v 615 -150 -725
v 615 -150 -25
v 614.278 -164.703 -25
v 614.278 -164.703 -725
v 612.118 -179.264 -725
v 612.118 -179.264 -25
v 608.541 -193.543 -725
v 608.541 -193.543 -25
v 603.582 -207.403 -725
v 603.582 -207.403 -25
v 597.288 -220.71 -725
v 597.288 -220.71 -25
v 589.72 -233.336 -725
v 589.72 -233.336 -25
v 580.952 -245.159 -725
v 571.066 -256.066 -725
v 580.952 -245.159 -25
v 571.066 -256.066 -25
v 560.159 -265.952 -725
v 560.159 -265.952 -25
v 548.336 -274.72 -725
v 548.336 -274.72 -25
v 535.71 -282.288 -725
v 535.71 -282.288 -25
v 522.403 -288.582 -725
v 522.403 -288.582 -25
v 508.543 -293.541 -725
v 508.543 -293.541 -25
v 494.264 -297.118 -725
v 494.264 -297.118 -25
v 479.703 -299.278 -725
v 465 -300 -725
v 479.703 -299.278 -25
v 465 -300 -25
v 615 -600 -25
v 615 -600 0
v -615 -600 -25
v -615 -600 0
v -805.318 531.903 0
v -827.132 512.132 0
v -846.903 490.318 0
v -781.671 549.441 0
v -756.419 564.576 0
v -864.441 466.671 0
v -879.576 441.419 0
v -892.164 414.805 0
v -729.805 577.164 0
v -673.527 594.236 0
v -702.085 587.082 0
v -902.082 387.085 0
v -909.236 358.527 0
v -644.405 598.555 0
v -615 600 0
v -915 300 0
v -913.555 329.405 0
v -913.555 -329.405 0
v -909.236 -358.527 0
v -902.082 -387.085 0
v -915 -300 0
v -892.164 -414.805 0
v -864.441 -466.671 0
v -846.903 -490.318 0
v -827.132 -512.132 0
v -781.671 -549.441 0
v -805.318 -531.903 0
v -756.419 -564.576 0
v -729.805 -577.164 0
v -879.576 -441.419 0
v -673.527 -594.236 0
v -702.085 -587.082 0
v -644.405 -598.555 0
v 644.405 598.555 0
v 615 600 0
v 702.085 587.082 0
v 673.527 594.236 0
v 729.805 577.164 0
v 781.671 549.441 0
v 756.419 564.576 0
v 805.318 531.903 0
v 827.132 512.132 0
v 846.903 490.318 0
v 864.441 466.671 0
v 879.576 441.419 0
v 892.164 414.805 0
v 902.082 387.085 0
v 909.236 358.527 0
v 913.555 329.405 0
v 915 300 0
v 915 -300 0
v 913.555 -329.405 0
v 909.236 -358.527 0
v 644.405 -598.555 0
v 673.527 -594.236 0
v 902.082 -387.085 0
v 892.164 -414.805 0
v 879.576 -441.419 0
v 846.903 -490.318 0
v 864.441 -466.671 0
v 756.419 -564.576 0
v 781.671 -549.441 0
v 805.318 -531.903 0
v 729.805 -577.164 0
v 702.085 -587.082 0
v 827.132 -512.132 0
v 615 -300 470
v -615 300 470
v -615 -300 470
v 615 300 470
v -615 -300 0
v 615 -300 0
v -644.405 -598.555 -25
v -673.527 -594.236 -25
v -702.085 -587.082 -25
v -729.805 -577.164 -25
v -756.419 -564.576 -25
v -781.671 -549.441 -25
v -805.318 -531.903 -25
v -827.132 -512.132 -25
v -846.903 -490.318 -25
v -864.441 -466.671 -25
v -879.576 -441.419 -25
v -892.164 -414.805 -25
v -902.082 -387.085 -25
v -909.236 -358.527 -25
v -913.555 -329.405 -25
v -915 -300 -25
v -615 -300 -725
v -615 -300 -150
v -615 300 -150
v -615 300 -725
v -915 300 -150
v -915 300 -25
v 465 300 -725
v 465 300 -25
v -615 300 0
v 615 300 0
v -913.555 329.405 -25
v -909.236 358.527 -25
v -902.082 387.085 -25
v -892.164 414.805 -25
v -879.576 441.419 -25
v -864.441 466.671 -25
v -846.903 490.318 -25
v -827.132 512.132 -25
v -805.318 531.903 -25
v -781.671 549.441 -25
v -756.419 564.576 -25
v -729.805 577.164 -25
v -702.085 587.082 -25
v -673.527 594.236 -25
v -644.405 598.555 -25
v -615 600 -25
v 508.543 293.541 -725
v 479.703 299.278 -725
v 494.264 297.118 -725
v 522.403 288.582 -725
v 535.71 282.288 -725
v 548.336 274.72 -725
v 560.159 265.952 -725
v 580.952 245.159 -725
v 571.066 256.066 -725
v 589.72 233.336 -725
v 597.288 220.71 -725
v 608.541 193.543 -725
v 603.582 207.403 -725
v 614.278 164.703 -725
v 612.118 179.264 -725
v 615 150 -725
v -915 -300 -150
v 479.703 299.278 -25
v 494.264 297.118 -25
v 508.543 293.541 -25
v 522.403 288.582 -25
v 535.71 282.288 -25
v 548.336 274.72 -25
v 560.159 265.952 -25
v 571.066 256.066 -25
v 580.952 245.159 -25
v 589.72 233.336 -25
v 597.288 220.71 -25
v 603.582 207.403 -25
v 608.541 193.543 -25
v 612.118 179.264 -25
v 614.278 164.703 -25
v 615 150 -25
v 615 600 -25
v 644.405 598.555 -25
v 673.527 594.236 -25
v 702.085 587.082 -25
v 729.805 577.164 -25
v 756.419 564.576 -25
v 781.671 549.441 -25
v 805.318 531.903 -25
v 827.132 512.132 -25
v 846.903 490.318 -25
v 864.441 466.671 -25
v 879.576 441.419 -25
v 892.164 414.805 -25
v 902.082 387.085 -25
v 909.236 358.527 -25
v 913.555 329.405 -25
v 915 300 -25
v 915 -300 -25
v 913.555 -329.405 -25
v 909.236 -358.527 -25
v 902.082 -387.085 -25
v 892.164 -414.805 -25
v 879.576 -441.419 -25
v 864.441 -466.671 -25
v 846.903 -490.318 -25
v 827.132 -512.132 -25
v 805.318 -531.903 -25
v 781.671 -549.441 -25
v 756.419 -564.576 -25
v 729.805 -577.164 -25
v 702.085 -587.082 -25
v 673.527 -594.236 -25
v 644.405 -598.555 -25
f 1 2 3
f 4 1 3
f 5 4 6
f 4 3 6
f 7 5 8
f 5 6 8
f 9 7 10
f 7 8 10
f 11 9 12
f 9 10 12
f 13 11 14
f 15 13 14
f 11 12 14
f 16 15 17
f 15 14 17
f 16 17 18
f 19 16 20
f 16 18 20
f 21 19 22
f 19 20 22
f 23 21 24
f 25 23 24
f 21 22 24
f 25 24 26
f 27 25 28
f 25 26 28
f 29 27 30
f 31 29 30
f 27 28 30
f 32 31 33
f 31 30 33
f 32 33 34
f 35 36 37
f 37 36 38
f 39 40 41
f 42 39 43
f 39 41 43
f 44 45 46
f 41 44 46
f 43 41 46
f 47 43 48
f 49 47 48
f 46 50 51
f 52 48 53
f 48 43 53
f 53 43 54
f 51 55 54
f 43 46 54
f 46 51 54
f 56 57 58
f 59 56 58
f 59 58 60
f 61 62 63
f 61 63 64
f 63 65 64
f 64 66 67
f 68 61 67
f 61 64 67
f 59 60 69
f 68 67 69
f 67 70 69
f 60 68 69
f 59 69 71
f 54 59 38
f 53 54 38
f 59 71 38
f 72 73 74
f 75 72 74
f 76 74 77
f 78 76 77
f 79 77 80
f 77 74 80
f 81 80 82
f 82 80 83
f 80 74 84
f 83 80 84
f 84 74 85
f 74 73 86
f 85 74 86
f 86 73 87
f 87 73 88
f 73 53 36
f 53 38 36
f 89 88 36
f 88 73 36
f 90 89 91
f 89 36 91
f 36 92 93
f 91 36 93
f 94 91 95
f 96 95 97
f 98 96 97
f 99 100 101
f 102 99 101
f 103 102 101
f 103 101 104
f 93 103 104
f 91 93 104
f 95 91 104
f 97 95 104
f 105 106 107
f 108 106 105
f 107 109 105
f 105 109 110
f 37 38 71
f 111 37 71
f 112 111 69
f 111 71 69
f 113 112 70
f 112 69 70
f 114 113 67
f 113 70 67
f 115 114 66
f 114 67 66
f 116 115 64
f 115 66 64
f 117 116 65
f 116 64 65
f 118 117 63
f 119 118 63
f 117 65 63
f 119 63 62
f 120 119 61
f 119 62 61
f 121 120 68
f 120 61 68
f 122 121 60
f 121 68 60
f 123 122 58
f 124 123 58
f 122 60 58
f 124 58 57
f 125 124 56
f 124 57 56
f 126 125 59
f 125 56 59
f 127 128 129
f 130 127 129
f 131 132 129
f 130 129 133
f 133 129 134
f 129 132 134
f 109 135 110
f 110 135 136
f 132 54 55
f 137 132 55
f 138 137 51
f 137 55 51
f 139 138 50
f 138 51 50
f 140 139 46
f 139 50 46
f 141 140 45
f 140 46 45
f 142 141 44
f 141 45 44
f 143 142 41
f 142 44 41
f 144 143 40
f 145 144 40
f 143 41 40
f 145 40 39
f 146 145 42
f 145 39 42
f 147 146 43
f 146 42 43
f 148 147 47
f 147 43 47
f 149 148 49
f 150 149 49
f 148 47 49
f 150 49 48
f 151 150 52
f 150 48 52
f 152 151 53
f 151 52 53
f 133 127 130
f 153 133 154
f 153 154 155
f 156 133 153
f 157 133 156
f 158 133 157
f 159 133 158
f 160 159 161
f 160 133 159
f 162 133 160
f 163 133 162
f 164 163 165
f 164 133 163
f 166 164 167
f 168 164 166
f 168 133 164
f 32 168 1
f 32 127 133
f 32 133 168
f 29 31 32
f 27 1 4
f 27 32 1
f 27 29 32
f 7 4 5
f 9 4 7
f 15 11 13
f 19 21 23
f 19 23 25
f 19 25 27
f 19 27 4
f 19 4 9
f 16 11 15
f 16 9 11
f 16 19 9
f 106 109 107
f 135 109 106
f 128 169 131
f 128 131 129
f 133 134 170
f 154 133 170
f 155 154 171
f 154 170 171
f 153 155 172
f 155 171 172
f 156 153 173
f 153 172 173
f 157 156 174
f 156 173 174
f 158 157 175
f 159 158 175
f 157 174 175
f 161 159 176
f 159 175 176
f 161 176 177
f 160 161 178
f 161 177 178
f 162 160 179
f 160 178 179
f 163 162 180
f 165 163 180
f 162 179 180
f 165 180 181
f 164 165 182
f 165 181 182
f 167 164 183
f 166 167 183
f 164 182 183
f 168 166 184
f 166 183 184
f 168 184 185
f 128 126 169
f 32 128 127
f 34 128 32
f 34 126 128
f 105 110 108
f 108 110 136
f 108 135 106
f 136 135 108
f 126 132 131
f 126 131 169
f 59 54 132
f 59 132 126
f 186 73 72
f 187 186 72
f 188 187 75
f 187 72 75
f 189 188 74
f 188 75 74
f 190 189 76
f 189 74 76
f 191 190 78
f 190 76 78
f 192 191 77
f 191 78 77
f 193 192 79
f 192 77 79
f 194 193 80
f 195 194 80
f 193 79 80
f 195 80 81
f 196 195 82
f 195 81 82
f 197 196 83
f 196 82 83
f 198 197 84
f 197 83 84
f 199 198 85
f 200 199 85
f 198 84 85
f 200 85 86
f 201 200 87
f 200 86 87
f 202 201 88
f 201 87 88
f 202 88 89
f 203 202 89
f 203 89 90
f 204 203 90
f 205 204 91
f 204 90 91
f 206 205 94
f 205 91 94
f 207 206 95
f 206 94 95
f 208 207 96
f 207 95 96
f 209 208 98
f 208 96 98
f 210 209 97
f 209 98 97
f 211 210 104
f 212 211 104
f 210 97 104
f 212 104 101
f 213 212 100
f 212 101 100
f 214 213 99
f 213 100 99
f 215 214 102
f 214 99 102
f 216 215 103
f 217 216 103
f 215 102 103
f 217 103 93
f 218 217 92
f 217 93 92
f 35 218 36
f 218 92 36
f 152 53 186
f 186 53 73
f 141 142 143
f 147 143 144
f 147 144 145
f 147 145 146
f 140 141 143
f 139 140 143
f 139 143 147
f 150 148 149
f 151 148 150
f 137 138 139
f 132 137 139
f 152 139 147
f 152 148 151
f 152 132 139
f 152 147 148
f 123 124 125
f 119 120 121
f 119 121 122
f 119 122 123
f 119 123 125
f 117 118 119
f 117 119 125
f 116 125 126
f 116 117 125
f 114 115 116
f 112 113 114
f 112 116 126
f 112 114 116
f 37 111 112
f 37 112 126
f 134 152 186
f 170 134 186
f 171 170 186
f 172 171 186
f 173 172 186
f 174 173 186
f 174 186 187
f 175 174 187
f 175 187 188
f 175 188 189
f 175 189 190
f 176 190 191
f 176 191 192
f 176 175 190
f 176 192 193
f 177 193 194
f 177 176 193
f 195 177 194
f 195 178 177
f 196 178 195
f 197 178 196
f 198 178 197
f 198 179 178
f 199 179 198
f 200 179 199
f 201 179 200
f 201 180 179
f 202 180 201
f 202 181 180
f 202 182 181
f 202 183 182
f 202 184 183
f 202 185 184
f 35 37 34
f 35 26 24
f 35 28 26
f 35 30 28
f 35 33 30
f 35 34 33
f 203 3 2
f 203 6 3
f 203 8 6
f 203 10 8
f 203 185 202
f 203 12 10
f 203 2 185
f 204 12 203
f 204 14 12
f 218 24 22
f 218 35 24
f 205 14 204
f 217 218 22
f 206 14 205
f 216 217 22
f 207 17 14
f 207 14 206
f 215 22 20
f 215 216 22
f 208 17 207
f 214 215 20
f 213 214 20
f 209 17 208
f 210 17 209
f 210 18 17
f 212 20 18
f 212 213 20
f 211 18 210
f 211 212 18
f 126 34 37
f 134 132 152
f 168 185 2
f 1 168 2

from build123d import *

# Parameters (mm, degrees)
F0_W     = 1230
F0_H     = 600
F1_DEPTH = 470
F2_W     = 1230
F2_H     = 600
F3_DEPTH = 25
F5_DEPTH = 700
F2_W_2   = 300
F6_DEPTH = 150


with BuildPart() as f1:
    # F0 (on Top) → F1 (new body)
    with BuildSketch(Plane.XY):
        Rectangle(F0_W, F0_H)
    extrude(amount=F1_DEPTH)


with BuildPart() as f3:
    # F2 (on face) → F3 (new body)
    with BuildSketch(Plane(origin=(0, 0, 0), x_dir=(1, 0, 0), z_dir=(0, 0, -1))):
        with BuildLine():
            Line((615, 600), (-615, 600))
            ThreePointArc((-615, 600), (-827.132034356, 512.132034356), (-915, 300))
            Line((-915, 300), (-615, 300))
            Line((-615, 300), (615, 300))
            Line((615, 300), (615, -300))
            Line((615, -300), (-615, -300))
            Line((-615, -300), (-915, -300))
            ThreePointArc((-915, -300), (-827.132034356, -512.132034356), (-615, -600))
            Line((-615, -600), (615, -600))
            ThreePointArc((615, -600), (827.132034356, -512.132034356), (915, -300))
            Line((915, -300), (915, 300))
            ThreePointArc((915, 300), (827.132034356, 512.132034356), (615, 600))
        make_face()
        Rectangle(F2_W, F2_H)
    extrude(amount=F3_DEPTH)

    # F4 (on face) → F5 (join)
    with BuildSketch(Plane(origin=(0, 0, -25), x_dir=(1, 0, 0), z_dir=(0, 0, -1))):
        with BuildLine():
            Line((-615, -300), (-465, -300))
            Line((-465, -300), (465, -300))
            ThreePointArc((465, -300), (571.066017178, -256.066017178), (615, -150))
            Line((615, -150), (615, 150))
            ThreePointArc((615, 150), (571.066017178, 256.066017178), (465, 300))
            Line((465, 300), (-465, 300))
            Line((-465, 300), (-615, 300))
            Line((-615, 300), (-615, 150))
            Line((-615, 150), (-615, -150))
            Line((-615, -150), (-615, -300))
        make_face()
    extrude(amount=F5_DEPTH)

    # F2 (on face) → F6 (join)
    with BuildSketch(Plane(origin=(0, 0, 0), x_dir=(1, 0, 0), z_dir=(0, 0, -1))):
        with Locations((-765, 0)):
            Rectangle(F2_W_2, F2_H)
    extrude(amount=F6_DEPTH)


solid = Compound([f1.part, f3.part])
